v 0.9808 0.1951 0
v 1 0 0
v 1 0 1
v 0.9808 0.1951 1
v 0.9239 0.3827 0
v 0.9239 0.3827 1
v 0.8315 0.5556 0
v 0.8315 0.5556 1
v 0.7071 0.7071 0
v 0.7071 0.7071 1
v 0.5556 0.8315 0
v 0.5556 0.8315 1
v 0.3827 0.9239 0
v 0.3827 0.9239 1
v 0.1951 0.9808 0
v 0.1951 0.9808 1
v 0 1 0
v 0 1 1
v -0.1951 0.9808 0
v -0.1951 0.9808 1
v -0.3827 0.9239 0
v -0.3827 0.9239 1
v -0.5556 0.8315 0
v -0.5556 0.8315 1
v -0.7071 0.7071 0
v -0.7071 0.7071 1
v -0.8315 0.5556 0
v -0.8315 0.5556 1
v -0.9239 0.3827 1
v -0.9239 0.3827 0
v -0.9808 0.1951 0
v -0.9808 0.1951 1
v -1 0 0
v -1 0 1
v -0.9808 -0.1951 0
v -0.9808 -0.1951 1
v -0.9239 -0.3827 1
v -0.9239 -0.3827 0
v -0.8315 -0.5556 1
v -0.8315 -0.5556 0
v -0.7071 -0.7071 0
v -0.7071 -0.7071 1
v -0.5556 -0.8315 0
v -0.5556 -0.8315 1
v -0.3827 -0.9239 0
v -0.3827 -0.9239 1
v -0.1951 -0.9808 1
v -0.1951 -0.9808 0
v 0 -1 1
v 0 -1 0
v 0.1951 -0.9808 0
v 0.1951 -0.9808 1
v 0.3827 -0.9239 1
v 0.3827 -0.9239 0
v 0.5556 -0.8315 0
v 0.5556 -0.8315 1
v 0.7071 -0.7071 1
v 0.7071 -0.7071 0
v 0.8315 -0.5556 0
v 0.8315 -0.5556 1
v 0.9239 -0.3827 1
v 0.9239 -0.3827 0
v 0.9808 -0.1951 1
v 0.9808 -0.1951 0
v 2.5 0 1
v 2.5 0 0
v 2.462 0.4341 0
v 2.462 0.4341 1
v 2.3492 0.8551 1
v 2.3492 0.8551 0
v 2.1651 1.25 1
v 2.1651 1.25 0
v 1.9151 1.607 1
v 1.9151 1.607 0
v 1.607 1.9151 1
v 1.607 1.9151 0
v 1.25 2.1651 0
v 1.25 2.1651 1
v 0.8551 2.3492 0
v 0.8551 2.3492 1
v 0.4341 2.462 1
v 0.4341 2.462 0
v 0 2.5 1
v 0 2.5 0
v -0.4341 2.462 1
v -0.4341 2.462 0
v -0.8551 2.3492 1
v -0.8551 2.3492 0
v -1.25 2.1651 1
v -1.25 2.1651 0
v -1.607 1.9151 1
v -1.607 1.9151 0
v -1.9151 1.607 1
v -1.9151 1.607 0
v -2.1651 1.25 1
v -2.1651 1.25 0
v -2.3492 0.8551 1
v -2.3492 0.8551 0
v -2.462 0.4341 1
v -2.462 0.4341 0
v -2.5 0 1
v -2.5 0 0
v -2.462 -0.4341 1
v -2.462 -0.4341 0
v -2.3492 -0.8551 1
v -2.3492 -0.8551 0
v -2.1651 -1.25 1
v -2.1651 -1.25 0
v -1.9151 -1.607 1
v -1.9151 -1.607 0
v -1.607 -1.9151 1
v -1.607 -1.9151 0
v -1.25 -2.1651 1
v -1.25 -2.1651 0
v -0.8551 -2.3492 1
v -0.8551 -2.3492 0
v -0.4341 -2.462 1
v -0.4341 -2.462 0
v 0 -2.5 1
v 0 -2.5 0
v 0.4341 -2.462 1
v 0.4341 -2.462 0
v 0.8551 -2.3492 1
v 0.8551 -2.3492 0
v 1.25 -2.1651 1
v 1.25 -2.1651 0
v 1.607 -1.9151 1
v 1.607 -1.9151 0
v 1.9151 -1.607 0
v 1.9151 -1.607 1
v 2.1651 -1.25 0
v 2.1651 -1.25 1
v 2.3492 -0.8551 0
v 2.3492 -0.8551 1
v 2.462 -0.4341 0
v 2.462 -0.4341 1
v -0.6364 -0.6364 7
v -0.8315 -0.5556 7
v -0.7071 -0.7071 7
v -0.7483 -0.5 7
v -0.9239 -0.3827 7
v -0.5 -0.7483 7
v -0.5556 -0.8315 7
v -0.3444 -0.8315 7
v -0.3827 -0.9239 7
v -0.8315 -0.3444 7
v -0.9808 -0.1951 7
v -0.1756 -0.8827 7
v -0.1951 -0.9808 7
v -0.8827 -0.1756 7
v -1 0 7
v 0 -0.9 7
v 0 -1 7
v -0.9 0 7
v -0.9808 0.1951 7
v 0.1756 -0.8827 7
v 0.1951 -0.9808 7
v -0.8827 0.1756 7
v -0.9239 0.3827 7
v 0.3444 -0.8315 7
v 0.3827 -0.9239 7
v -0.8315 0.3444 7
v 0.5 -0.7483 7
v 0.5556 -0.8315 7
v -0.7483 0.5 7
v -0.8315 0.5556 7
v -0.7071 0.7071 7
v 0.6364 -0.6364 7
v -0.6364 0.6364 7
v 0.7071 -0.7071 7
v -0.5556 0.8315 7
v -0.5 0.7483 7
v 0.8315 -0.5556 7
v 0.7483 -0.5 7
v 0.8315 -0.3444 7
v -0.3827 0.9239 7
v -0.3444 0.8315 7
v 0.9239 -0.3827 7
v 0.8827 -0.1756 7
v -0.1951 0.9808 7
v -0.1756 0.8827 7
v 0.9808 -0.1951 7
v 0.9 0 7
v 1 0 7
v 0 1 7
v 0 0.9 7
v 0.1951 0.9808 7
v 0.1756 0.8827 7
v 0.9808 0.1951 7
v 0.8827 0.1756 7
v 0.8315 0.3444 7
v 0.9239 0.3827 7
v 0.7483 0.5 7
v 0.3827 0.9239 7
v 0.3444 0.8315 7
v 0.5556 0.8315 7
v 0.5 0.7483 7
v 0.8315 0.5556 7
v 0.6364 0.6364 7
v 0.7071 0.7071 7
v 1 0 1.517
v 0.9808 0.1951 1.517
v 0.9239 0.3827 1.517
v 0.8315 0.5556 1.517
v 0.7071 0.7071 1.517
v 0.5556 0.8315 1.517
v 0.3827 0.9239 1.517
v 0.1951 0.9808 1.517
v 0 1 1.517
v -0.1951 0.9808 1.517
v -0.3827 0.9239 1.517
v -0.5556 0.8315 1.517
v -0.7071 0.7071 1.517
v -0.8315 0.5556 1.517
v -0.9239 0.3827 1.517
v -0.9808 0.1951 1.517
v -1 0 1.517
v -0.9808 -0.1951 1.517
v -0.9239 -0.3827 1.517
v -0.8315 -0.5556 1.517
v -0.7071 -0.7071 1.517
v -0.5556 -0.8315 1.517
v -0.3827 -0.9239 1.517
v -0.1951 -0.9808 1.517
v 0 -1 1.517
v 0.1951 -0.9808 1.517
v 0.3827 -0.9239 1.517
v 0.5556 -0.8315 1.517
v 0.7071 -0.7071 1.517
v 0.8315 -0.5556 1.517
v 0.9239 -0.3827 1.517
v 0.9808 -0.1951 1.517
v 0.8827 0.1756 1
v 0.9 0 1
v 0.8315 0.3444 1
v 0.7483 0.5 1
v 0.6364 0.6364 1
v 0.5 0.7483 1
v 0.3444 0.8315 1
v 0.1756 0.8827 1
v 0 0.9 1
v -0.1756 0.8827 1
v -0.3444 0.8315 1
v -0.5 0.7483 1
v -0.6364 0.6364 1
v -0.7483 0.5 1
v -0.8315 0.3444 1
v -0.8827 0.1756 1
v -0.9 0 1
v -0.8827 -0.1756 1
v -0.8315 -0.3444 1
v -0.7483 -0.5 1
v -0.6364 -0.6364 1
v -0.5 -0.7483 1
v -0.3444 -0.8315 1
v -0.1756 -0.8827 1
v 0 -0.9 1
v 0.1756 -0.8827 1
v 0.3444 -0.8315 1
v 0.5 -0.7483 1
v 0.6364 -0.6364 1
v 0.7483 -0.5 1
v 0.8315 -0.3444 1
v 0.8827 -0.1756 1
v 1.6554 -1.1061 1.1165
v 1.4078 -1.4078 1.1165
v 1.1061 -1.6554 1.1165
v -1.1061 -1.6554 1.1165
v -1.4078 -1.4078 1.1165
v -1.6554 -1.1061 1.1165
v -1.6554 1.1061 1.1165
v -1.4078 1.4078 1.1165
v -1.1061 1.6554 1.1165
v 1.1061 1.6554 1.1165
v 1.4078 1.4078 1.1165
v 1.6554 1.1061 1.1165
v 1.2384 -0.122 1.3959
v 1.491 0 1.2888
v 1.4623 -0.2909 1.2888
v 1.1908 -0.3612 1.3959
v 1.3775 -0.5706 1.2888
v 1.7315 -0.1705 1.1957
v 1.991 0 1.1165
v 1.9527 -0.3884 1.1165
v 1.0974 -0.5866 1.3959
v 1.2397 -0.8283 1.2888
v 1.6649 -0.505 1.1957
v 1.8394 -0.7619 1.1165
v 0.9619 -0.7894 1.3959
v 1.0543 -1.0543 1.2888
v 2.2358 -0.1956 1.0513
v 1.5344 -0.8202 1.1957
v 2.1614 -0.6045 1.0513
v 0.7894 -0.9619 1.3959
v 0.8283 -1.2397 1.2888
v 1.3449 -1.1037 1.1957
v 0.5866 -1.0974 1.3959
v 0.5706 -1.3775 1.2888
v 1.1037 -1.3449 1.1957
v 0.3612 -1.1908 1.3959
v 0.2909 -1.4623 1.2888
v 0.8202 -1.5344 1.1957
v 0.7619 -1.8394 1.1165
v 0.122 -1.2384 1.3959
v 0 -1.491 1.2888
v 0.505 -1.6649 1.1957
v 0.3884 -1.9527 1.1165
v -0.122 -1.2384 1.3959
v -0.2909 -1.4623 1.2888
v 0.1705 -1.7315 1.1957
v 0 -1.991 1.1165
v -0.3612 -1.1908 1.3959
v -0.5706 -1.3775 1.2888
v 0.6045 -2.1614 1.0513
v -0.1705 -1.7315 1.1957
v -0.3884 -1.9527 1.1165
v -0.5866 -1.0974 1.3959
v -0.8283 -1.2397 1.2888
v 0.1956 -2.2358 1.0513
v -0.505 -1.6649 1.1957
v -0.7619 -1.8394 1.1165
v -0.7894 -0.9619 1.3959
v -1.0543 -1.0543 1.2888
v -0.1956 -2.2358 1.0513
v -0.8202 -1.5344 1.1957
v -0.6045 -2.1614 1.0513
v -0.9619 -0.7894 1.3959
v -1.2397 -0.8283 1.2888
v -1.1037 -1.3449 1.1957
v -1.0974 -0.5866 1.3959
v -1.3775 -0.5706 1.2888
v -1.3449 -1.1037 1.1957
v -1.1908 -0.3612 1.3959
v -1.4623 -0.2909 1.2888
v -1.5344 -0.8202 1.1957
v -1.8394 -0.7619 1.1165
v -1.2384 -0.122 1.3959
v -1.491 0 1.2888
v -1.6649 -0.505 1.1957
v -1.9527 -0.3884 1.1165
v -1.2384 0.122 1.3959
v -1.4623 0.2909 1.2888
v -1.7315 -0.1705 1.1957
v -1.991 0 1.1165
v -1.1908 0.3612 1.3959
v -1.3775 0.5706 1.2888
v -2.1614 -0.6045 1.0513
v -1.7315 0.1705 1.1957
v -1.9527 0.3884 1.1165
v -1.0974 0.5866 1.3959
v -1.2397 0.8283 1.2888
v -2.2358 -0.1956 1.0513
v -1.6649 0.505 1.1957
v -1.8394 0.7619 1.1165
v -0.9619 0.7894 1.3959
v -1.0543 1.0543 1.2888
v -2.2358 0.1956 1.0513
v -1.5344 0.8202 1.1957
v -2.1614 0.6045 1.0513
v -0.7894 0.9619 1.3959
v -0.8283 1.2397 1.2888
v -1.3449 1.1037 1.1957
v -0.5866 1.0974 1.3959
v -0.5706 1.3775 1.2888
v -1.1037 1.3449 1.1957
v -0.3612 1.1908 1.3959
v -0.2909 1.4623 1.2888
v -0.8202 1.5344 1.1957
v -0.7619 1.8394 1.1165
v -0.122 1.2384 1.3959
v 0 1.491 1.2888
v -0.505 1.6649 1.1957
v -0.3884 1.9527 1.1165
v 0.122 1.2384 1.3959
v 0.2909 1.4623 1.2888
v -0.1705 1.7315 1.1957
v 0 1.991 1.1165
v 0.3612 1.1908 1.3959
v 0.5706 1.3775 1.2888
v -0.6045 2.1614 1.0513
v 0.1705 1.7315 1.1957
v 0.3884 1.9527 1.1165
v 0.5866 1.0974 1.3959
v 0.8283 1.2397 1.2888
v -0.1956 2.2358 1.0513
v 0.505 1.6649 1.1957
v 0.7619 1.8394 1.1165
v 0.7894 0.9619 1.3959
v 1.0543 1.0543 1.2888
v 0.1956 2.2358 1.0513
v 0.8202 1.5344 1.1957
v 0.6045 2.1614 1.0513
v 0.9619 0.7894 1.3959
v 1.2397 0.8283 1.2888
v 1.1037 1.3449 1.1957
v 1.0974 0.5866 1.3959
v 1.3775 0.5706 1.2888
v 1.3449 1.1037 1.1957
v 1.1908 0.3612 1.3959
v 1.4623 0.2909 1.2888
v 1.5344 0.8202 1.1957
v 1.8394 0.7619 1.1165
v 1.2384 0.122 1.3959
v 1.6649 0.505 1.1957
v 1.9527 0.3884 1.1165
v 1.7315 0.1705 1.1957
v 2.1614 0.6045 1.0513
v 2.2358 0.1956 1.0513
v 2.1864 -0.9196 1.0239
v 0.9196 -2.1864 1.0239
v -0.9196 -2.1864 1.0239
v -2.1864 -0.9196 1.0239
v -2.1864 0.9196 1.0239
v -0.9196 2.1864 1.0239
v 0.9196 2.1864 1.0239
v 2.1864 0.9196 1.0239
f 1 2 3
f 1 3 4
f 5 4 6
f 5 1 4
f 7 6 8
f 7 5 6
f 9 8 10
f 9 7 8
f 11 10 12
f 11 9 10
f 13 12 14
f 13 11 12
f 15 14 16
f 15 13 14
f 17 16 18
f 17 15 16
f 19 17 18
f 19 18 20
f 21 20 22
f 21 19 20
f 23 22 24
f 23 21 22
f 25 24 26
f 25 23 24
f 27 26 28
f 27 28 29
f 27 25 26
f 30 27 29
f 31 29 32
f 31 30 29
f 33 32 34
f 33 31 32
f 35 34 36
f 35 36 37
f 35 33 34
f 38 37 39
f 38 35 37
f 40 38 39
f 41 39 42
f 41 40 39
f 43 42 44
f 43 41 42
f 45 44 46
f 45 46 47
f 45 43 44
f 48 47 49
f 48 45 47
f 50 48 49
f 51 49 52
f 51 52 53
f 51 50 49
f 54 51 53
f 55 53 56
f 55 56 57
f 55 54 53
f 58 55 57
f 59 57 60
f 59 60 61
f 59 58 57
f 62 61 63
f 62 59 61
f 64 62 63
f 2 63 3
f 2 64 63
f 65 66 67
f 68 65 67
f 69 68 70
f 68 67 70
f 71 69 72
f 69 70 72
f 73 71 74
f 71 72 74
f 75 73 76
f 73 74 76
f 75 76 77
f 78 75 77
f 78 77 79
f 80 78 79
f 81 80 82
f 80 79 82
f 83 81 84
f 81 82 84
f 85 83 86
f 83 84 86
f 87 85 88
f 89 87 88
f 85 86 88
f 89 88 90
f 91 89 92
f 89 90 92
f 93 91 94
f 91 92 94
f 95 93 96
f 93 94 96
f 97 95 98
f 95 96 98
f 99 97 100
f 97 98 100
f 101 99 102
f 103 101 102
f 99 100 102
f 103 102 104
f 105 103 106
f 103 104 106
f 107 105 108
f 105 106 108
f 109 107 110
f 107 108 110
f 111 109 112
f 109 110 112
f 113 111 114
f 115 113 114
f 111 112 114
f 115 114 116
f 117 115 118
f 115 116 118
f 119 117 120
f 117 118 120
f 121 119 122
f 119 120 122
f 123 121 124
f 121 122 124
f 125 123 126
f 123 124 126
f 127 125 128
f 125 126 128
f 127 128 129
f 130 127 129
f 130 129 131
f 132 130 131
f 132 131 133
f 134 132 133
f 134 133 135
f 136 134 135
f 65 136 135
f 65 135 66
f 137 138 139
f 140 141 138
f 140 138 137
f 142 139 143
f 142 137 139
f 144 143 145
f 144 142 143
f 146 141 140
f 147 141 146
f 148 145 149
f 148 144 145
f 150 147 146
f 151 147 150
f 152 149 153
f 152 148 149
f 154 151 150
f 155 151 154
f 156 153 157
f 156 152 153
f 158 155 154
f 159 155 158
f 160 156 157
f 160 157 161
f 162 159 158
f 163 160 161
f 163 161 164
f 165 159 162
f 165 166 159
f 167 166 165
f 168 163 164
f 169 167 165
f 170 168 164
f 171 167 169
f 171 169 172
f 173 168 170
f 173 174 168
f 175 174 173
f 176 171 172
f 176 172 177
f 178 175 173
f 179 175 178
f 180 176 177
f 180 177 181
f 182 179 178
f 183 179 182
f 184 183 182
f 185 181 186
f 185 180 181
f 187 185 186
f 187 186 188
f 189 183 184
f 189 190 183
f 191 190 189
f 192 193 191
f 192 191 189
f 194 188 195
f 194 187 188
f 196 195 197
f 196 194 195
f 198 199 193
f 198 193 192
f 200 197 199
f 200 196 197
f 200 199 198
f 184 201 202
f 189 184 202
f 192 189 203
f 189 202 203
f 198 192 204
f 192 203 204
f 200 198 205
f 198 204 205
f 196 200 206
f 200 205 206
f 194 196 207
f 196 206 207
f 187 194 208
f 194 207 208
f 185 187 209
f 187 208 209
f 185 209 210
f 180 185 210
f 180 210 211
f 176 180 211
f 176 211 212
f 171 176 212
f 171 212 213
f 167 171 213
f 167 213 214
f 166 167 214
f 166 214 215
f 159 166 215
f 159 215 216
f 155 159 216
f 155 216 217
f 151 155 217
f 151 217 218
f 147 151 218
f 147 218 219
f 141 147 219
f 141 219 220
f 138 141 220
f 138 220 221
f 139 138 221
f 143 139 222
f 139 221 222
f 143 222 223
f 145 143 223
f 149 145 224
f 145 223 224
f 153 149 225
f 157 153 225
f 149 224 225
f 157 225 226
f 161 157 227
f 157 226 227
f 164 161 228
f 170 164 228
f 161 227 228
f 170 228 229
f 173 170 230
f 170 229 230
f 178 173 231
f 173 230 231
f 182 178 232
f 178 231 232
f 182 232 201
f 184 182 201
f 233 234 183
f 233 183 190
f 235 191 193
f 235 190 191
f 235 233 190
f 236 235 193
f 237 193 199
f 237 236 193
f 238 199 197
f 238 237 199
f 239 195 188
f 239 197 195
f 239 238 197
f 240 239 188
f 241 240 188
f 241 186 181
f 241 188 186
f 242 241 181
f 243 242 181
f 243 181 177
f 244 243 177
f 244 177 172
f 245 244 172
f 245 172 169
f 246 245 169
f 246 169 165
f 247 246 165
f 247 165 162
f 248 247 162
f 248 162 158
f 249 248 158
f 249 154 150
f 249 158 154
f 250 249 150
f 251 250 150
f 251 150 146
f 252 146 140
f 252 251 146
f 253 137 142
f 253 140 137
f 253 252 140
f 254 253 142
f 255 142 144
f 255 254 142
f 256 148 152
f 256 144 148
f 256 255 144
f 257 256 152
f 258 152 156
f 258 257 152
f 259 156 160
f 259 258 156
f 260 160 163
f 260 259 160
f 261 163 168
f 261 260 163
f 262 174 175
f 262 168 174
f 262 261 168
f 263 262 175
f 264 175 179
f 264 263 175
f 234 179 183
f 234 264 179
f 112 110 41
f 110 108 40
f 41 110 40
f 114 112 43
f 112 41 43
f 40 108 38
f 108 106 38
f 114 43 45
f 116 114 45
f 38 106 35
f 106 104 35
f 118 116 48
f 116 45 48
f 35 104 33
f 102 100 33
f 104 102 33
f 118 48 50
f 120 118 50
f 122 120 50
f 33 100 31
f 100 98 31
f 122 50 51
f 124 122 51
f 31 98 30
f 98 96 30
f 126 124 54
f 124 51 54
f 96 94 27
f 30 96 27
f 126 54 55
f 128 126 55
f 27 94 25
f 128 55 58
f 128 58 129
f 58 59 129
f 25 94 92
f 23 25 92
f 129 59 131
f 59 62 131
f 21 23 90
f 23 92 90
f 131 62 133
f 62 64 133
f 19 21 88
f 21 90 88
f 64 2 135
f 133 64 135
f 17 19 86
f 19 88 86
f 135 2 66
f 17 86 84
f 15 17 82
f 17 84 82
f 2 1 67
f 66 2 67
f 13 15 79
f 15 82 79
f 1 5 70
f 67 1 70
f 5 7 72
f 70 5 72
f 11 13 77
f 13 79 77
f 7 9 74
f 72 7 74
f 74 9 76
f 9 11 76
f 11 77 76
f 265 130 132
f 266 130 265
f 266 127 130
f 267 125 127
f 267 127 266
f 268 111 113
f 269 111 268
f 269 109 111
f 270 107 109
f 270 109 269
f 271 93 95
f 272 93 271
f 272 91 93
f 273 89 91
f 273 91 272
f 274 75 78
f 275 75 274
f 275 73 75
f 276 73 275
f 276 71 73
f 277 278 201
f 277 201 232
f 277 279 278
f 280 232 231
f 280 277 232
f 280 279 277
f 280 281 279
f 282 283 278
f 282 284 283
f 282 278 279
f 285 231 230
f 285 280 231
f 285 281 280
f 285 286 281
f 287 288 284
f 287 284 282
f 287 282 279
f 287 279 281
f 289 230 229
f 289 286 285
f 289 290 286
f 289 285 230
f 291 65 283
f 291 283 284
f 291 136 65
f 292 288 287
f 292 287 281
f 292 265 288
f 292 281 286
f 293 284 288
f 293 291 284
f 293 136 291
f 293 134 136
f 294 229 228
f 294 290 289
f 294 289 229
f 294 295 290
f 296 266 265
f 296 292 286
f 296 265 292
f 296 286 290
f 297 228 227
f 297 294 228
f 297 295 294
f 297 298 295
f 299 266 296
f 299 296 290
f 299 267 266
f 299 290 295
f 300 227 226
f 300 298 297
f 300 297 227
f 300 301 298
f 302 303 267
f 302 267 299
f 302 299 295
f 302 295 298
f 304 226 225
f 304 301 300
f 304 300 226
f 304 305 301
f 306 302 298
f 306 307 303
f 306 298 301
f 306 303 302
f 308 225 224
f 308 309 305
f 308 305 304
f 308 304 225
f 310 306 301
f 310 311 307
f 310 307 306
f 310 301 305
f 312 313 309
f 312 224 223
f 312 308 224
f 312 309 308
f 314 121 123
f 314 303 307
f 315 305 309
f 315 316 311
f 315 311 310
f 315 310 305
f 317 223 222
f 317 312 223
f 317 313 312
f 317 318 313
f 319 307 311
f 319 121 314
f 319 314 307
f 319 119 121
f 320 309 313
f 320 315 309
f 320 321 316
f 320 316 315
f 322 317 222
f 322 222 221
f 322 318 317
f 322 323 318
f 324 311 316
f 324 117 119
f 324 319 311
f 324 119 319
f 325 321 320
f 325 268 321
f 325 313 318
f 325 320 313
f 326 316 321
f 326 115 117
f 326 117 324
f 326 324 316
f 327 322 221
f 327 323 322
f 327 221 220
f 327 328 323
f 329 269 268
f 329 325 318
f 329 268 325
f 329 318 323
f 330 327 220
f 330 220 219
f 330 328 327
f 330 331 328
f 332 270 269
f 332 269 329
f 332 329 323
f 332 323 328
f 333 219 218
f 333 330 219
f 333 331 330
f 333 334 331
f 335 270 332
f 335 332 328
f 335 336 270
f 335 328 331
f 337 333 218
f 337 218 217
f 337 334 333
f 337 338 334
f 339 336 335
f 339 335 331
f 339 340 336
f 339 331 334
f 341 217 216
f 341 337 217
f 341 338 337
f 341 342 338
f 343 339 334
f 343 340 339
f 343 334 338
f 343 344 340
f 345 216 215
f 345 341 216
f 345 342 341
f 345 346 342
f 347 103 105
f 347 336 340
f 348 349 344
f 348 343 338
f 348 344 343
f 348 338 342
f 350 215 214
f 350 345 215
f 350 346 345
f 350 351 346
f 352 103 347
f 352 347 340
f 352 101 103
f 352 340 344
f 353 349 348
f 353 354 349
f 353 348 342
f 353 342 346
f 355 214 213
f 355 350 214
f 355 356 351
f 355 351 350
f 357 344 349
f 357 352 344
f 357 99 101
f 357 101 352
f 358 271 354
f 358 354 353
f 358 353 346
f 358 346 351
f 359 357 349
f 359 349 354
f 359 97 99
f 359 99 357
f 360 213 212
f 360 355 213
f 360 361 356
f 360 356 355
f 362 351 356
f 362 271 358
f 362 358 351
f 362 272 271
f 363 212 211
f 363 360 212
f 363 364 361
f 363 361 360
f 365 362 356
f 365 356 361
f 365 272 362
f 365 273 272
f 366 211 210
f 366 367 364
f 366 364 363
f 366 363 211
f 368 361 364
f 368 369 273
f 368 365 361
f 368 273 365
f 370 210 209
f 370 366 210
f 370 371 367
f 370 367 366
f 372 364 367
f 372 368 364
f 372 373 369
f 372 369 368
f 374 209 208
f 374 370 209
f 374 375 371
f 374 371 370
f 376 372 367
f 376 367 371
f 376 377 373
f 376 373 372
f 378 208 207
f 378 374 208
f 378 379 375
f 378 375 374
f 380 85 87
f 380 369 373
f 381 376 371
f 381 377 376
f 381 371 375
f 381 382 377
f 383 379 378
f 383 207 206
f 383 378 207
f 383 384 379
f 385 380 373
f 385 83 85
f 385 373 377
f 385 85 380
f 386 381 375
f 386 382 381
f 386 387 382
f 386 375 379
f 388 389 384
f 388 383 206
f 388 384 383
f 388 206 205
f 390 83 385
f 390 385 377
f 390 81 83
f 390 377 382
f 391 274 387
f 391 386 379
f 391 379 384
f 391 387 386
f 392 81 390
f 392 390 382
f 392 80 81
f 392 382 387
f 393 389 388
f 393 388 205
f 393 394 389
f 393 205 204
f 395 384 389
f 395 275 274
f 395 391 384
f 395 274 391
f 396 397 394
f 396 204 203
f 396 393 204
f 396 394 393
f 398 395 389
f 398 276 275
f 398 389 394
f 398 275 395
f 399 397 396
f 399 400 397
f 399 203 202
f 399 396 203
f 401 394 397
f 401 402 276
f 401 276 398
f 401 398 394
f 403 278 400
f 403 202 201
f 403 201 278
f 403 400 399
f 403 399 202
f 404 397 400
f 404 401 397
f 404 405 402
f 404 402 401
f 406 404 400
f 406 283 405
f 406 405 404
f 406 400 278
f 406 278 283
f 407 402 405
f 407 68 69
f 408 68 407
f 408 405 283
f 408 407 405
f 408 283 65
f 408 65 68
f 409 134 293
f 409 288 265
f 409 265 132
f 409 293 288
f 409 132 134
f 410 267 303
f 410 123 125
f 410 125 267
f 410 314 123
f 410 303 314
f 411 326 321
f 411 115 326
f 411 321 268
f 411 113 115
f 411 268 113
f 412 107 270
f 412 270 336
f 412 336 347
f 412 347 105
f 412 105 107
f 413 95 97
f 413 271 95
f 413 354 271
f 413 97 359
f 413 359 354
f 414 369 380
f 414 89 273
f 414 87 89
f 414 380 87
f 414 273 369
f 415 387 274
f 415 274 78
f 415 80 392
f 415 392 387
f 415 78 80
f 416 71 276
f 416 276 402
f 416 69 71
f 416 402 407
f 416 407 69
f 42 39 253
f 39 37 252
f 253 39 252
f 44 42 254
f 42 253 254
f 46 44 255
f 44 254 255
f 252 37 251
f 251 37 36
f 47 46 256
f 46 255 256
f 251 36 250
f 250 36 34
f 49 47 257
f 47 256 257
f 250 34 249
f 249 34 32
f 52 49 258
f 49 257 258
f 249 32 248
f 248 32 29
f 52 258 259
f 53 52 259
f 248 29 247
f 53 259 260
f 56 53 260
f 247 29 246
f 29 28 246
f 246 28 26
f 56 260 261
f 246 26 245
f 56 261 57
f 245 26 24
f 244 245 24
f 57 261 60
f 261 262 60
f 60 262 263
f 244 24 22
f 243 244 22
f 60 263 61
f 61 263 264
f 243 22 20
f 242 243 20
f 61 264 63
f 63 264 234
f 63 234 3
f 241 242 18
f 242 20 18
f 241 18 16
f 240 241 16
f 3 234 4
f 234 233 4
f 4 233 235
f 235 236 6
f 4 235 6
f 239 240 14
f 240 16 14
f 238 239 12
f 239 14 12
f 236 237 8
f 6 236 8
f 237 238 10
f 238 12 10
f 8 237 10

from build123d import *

# Parameters (mm, degrees)
CROQUIS1_R              = 2.5
CROQUIS1_R_2            = 1
SALIENTE_EXTRUIR1_DEPTH = 1
CROQUIS2_R              = 1
SALIENTE_EXTRUIR2_DEPTH = 6
VACIADO2_T              = -0.1


with BuildPart() as part:
    # Croquis1 → Saliente-Extruir1 (new body)
    with BuildSketch(Plane.XY):
        Circle(CROQUIS1_R)
        Circle(CROQUIS1_R_2, mode=Mode.SUBTRACT)
    extrude(amount=SALIENTE_EXTRUIR1_DEPTH)



with BuildPart() as body_2:
    # Croquis2 → Saliente-Extruir2 (new body)
    with BuildSketch(Plane.XY.offset(1)):
        Circle(CROQUIS2_R)
    extrude(amount=SALIENTE_EXTRUIR2_DEPTH)

    # Vaciado2
    vaciado2_openings = [body_2.faces().sort_by_distance(p)[0] for p in [
        (0, 0, 7),
        (0, 0, 1),
    ]]
    offset(amount=VACIADO2_T, openings=vaciado2_openings, kind=Kind.INTERSECTION)


with BuildPart() as part_1:
    add(part.part)

    add(body_2.part)  # Revolución2 merges body 2
    # Croquis3 → Revolución2 (revolve)
    with BuildSketch(Plane(origin=(0, 0, 0), x_dir=(0, 0, -1), z_dir=(1, 0, 0)), mode=Mode.PRIVATE) as revoluci_n2_sk:
        with BuildLine():
            Line((-1, 2.5), (-1, 1))
            Line((-1, 1), (-1.517000999, 1))
            add(Edge.make_bspline(
                [(-1.517000999, 1), (-1.132819845, 1.729659773), (-1, 2.5)],
                knots=[0, 0, 0, 1, 1, 1], degree=2))
        make_face()
    revolve(revoluci_n2_sk.sketch.rotate(Axis((0, 0, 7.040846827), (0, 0, -1)), 90), axis=Axis((0, 0, 7.040846827), (0, 0, -1)))


solid = part_1.part
